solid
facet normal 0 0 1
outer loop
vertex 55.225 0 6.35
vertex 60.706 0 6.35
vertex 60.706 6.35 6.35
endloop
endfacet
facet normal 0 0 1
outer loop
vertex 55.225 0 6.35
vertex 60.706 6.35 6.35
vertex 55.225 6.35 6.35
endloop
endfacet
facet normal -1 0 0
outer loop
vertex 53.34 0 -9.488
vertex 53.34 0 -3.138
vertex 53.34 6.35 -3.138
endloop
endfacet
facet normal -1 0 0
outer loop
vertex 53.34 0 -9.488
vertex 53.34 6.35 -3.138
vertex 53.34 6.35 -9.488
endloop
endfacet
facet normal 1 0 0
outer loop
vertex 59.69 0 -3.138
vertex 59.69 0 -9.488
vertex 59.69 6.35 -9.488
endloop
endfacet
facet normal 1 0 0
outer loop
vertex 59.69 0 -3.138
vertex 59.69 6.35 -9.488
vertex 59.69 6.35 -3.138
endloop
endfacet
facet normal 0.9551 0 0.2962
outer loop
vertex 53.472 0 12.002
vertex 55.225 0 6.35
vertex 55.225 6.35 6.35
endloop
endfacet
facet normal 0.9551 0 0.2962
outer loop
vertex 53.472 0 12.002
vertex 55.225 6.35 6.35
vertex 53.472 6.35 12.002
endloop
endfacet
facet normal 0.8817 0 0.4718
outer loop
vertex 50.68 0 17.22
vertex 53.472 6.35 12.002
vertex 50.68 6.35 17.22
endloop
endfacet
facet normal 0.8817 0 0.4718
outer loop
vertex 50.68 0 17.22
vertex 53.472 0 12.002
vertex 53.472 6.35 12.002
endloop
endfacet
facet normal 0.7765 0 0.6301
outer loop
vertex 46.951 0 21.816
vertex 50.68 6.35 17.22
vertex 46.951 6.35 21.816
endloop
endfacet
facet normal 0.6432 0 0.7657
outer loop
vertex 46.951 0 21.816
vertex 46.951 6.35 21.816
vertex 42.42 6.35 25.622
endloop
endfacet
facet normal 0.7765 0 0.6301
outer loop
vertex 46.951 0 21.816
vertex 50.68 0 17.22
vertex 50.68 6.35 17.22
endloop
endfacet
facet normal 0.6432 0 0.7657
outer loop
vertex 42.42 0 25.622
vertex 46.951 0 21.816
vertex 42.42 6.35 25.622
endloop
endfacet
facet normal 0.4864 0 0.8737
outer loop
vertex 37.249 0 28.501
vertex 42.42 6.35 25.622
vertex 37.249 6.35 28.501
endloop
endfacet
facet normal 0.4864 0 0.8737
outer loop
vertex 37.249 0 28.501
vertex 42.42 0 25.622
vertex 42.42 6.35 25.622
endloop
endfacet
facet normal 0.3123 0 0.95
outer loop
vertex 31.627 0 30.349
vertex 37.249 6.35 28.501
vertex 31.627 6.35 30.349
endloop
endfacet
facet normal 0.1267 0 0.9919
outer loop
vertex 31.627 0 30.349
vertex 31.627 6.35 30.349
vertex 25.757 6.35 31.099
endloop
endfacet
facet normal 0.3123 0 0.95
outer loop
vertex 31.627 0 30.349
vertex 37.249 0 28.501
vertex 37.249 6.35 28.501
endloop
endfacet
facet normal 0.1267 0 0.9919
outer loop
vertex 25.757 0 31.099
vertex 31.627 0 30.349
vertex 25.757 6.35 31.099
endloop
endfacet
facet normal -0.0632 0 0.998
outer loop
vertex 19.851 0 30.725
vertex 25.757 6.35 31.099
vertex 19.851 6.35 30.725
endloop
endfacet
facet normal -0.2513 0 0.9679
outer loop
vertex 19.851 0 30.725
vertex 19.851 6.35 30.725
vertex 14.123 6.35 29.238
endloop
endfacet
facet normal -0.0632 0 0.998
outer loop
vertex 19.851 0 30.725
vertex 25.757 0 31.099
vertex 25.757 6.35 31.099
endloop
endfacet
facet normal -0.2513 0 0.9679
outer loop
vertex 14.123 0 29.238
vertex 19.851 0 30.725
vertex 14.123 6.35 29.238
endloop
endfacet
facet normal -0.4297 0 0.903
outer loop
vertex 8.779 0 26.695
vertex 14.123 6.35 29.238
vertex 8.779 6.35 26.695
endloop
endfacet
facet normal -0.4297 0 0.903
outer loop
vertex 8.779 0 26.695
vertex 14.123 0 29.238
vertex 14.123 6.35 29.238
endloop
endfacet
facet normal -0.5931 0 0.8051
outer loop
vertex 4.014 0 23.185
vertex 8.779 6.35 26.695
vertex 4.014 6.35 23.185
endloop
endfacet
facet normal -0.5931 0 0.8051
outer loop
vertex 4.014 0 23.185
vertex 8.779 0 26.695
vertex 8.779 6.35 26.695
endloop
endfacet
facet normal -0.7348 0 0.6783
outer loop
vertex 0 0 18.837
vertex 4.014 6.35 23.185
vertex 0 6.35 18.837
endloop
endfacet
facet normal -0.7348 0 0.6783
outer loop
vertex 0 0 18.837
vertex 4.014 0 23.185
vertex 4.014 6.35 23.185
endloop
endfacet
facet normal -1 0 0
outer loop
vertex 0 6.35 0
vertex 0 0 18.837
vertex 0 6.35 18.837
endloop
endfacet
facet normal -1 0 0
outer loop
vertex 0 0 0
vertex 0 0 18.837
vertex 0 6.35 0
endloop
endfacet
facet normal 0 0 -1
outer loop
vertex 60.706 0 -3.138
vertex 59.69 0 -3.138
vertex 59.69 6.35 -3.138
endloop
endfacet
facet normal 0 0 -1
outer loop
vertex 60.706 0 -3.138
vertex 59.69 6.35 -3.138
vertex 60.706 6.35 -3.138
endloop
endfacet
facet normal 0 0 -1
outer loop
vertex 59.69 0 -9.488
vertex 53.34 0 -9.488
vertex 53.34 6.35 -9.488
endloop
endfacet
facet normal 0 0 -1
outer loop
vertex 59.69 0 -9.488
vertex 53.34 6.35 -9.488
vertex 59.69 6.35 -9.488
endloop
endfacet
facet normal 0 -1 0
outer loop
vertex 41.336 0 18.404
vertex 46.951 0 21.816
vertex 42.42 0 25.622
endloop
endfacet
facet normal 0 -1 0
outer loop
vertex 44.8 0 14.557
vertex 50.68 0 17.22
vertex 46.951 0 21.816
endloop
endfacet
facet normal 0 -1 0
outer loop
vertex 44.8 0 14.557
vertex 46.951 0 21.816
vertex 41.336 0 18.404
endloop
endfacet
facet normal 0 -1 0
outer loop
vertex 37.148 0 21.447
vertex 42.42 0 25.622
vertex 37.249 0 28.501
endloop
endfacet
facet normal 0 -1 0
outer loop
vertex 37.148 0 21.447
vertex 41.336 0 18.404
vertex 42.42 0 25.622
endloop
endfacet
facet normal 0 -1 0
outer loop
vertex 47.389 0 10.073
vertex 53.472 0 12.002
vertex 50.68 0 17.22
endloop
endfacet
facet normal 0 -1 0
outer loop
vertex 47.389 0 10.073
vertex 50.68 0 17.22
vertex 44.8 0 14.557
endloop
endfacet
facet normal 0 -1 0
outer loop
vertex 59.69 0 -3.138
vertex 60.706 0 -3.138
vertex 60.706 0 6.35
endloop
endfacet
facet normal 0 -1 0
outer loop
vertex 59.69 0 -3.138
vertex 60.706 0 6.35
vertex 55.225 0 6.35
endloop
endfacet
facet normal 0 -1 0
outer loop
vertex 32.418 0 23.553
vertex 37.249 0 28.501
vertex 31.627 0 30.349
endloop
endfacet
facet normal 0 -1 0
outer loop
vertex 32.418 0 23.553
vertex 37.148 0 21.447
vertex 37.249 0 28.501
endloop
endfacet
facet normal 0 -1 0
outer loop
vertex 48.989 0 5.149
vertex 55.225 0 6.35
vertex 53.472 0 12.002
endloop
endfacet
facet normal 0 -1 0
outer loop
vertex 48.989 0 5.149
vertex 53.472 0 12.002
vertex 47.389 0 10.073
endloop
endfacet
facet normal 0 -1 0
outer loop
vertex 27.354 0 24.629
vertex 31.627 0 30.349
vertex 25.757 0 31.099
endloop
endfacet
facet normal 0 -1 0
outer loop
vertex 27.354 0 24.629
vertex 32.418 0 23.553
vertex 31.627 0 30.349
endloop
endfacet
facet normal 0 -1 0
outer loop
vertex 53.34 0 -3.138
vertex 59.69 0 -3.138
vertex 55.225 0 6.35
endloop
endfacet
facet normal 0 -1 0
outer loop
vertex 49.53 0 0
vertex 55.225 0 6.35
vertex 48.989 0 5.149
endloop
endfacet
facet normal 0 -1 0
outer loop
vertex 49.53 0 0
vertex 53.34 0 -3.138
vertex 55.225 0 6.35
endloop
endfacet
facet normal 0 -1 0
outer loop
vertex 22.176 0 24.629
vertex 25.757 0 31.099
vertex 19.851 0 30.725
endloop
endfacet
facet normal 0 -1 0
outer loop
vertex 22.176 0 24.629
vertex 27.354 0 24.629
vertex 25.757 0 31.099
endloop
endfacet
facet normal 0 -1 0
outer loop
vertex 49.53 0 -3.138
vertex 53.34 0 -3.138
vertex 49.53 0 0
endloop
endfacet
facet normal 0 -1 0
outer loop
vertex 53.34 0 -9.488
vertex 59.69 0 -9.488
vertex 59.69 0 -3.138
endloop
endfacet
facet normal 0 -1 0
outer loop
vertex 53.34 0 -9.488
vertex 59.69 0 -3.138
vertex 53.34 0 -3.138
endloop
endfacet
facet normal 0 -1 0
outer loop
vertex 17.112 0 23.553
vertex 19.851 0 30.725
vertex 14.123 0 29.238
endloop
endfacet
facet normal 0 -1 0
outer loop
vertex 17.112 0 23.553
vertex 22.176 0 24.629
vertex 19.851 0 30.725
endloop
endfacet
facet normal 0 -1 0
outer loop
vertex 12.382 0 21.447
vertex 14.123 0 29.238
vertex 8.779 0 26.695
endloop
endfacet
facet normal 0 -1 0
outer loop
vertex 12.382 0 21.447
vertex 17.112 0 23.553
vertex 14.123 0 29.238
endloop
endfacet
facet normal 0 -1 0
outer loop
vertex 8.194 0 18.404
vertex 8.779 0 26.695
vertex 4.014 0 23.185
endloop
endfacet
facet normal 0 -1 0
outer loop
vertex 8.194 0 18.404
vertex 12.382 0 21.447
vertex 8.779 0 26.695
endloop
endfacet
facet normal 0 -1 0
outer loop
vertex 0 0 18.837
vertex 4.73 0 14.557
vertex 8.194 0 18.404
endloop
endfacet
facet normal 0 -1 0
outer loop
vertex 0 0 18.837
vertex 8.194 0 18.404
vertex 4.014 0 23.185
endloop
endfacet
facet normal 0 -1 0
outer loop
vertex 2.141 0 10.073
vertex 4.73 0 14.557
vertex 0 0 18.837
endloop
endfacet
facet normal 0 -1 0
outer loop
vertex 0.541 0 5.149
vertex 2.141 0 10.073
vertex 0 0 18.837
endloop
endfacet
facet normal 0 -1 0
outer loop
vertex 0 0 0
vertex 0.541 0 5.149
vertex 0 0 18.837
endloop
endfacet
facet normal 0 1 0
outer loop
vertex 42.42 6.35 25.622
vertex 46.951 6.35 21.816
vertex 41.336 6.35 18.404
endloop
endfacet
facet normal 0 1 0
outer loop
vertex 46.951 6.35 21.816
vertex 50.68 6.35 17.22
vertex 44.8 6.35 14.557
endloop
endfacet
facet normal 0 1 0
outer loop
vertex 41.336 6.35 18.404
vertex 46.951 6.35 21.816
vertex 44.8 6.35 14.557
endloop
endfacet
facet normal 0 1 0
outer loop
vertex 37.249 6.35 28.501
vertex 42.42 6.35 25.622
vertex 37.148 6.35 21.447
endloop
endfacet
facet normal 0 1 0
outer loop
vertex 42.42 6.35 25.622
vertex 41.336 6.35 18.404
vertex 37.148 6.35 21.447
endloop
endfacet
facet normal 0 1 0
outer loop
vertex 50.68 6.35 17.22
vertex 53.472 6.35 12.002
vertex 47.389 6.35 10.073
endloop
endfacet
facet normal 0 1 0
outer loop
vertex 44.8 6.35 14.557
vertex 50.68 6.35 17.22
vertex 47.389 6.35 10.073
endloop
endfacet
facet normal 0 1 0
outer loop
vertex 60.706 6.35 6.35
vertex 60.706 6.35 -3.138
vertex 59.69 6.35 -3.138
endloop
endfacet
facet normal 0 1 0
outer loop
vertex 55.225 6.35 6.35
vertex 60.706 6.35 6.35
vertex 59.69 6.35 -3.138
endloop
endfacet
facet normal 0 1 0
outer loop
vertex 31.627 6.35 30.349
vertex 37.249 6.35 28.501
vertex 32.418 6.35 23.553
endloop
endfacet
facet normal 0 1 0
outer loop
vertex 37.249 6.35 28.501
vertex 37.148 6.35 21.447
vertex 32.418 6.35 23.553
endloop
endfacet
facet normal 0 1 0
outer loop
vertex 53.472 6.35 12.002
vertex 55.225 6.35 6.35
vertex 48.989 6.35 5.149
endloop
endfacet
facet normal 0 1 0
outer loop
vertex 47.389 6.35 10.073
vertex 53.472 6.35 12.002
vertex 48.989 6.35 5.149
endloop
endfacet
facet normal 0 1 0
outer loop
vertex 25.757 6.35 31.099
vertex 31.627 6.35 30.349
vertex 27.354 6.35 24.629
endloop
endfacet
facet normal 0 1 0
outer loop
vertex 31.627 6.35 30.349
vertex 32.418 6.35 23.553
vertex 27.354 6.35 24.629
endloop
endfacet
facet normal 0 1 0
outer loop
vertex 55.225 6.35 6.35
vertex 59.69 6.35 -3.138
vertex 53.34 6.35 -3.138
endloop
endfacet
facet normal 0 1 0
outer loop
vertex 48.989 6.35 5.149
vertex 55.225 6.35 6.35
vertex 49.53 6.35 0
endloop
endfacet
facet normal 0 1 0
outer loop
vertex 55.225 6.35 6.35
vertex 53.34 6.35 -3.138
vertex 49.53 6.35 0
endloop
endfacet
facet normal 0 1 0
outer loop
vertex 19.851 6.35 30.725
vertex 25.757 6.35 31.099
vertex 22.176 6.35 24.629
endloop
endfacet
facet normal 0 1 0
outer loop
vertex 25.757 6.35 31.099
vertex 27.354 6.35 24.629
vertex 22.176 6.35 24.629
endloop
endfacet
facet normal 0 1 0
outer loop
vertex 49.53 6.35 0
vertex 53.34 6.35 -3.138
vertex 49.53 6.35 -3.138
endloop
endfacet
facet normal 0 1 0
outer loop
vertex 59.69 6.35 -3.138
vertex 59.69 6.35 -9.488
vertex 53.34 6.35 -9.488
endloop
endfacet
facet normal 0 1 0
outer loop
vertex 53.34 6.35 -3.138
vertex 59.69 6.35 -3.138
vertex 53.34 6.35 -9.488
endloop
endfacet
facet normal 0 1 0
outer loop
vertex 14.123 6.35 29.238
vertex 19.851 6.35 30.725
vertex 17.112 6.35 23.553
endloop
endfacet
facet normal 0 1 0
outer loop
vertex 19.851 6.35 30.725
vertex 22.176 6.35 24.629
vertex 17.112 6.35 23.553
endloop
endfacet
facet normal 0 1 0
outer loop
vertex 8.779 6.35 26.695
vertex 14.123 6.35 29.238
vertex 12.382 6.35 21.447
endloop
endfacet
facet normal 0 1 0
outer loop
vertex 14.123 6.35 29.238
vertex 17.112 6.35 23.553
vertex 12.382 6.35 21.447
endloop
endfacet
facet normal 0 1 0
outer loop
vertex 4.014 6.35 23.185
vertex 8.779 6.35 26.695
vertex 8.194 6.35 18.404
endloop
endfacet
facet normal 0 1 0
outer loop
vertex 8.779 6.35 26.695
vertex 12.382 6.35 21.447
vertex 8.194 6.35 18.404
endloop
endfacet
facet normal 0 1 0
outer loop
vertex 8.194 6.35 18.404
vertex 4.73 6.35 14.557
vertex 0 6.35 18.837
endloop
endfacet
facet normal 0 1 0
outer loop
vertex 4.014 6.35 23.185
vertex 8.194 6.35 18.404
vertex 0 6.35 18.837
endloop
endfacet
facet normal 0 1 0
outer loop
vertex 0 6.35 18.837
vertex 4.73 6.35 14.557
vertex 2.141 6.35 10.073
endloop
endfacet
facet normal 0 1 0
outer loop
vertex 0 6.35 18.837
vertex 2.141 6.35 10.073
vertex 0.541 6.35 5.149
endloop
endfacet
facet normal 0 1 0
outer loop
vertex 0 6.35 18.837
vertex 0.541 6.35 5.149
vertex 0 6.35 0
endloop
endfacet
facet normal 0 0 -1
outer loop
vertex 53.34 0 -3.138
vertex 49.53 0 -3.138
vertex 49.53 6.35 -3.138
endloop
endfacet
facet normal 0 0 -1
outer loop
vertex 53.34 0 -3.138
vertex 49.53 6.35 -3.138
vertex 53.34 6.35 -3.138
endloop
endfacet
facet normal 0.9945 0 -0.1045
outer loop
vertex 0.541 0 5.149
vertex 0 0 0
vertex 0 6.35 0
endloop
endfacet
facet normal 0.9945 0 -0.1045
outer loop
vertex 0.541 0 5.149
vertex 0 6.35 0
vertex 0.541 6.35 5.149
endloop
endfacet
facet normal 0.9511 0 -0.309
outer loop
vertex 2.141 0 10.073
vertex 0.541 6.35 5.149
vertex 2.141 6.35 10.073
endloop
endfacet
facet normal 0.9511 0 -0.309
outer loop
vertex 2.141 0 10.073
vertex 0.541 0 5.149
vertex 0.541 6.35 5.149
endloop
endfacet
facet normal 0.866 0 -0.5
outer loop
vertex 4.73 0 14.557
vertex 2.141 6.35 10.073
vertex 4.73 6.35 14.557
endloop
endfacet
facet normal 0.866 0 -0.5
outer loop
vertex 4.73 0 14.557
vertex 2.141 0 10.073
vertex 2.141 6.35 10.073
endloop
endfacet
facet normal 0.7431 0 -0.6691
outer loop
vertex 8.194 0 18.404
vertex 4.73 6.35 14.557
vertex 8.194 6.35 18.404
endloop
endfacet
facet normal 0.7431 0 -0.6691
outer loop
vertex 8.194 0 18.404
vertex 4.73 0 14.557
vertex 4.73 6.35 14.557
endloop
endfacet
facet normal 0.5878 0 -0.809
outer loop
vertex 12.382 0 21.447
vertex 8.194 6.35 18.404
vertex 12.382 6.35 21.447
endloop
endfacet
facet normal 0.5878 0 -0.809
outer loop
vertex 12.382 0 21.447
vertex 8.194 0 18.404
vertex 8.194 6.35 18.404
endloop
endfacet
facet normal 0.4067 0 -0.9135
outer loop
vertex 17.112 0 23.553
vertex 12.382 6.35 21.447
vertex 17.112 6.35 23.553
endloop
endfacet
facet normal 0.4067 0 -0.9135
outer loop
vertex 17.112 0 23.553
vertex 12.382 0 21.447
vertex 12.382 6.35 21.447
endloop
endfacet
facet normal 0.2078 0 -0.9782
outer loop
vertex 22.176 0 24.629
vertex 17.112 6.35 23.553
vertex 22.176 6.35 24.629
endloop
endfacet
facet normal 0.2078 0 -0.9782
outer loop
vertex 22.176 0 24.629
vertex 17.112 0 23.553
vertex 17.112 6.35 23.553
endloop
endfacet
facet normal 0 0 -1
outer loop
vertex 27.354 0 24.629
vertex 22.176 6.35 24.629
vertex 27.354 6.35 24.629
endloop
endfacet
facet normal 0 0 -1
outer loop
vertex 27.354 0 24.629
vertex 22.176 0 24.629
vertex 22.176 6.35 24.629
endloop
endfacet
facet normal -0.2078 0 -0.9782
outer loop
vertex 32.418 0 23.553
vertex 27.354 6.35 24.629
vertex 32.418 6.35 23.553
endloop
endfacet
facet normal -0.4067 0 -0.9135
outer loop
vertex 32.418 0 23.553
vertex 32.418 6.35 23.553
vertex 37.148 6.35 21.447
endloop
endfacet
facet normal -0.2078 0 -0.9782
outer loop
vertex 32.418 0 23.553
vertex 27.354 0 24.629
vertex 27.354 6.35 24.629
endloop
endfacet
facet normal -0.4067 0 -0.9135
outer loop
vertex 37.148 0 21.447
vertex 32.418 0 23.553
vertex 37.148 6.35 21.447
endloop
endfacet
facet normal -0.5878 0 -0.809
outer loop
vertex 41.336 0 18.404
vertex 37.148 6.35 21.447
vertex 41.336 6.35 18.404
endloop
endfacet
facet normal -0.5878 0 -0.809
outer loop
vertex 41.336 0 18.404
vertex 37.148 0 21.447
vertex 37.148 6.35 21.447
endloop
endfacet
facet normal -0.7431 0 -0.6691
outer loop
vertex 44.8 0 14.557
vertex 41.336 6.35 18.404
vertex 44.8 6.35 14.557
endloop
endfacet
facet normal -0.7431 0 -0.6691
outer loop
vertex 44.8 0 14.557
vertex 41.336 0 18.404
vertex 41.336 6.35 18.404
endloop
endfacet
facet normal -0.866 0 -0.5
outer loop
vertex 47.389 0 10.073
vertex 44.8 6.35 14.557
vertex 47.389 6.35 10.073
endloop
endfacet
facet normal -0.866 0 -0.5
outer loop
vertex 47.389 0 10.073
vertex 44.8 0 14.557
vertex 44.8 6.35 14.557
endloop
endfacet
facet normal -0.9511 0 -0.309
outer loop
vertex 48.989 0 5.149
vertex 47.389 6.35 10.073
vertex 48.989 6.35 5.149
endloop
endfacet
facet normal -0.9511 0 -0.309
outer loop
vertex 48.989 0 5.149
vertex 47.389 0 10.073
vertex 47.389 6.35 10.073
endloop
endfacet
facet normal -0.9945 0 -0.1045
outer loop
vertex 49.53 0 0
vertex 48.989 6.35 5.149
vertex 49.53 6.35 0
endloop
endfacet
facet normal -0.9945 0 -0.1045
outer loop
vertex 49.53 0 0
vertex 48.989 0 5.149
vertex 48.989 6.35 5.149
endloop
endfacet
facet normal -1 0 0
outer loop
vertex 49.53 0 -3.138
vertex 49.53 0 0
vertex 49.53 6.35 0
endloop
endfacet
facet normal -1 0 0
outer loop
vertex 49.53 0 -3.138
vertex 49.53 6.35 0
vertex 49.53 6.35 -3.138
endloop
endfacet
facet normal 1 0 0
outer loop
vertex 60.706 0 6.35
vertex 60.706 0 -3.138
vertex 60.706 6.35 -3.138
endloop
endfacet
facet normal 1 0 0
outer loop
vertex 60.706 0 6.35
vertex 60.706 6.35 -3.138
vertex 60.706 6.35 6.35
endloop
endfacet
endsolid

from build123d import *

# Parameters (mm, degrees)
BOSS_EXTRUDE1_DEPTH = 6.35


with BuildPart() as part:
    # Sketch1 → Boss-Extrude1 (new body)
    with BuildSketch(Plane(origin=(0, 0, 0), x_dir=(1, 0, 0), z_dir=(0, 1, 0))):
        with BuildLine():
            Line((53.34, 3.137679315), (53.34, 9.487679315))
            Line((53.34, 9.487679315), (59.69, 9.487679315))
            Line((59.69, 9.487679315), (59.69, 3.137679315))
            Line((59.69, 3.137679315), (60.706, 3.137679315))
            Line((60.706, 3.137679315), (60.706, 0))
            Line((60.706, 0), (60.706, -6.35))
            Line((60.706, -6.35), (55.225149786, -6.35))
            ThreePointArc((55.225149786, -6.35), (31.627279146, -30.348844293), (0, -18.837144157))
            Line((0, -18.837144157), (0, 0))
            ThreePointArc((0, 0), (24.765, -24.765), (49.53, 0))
            Line((49.53, 0), (49.53, 3.137679315))
            Line((49.53, 3.137679315), (53.34, 3.137679315))
        make_face()
    extrude(amount=BOSS_EXTRUDE1_DEPTH)


solid = part.part
